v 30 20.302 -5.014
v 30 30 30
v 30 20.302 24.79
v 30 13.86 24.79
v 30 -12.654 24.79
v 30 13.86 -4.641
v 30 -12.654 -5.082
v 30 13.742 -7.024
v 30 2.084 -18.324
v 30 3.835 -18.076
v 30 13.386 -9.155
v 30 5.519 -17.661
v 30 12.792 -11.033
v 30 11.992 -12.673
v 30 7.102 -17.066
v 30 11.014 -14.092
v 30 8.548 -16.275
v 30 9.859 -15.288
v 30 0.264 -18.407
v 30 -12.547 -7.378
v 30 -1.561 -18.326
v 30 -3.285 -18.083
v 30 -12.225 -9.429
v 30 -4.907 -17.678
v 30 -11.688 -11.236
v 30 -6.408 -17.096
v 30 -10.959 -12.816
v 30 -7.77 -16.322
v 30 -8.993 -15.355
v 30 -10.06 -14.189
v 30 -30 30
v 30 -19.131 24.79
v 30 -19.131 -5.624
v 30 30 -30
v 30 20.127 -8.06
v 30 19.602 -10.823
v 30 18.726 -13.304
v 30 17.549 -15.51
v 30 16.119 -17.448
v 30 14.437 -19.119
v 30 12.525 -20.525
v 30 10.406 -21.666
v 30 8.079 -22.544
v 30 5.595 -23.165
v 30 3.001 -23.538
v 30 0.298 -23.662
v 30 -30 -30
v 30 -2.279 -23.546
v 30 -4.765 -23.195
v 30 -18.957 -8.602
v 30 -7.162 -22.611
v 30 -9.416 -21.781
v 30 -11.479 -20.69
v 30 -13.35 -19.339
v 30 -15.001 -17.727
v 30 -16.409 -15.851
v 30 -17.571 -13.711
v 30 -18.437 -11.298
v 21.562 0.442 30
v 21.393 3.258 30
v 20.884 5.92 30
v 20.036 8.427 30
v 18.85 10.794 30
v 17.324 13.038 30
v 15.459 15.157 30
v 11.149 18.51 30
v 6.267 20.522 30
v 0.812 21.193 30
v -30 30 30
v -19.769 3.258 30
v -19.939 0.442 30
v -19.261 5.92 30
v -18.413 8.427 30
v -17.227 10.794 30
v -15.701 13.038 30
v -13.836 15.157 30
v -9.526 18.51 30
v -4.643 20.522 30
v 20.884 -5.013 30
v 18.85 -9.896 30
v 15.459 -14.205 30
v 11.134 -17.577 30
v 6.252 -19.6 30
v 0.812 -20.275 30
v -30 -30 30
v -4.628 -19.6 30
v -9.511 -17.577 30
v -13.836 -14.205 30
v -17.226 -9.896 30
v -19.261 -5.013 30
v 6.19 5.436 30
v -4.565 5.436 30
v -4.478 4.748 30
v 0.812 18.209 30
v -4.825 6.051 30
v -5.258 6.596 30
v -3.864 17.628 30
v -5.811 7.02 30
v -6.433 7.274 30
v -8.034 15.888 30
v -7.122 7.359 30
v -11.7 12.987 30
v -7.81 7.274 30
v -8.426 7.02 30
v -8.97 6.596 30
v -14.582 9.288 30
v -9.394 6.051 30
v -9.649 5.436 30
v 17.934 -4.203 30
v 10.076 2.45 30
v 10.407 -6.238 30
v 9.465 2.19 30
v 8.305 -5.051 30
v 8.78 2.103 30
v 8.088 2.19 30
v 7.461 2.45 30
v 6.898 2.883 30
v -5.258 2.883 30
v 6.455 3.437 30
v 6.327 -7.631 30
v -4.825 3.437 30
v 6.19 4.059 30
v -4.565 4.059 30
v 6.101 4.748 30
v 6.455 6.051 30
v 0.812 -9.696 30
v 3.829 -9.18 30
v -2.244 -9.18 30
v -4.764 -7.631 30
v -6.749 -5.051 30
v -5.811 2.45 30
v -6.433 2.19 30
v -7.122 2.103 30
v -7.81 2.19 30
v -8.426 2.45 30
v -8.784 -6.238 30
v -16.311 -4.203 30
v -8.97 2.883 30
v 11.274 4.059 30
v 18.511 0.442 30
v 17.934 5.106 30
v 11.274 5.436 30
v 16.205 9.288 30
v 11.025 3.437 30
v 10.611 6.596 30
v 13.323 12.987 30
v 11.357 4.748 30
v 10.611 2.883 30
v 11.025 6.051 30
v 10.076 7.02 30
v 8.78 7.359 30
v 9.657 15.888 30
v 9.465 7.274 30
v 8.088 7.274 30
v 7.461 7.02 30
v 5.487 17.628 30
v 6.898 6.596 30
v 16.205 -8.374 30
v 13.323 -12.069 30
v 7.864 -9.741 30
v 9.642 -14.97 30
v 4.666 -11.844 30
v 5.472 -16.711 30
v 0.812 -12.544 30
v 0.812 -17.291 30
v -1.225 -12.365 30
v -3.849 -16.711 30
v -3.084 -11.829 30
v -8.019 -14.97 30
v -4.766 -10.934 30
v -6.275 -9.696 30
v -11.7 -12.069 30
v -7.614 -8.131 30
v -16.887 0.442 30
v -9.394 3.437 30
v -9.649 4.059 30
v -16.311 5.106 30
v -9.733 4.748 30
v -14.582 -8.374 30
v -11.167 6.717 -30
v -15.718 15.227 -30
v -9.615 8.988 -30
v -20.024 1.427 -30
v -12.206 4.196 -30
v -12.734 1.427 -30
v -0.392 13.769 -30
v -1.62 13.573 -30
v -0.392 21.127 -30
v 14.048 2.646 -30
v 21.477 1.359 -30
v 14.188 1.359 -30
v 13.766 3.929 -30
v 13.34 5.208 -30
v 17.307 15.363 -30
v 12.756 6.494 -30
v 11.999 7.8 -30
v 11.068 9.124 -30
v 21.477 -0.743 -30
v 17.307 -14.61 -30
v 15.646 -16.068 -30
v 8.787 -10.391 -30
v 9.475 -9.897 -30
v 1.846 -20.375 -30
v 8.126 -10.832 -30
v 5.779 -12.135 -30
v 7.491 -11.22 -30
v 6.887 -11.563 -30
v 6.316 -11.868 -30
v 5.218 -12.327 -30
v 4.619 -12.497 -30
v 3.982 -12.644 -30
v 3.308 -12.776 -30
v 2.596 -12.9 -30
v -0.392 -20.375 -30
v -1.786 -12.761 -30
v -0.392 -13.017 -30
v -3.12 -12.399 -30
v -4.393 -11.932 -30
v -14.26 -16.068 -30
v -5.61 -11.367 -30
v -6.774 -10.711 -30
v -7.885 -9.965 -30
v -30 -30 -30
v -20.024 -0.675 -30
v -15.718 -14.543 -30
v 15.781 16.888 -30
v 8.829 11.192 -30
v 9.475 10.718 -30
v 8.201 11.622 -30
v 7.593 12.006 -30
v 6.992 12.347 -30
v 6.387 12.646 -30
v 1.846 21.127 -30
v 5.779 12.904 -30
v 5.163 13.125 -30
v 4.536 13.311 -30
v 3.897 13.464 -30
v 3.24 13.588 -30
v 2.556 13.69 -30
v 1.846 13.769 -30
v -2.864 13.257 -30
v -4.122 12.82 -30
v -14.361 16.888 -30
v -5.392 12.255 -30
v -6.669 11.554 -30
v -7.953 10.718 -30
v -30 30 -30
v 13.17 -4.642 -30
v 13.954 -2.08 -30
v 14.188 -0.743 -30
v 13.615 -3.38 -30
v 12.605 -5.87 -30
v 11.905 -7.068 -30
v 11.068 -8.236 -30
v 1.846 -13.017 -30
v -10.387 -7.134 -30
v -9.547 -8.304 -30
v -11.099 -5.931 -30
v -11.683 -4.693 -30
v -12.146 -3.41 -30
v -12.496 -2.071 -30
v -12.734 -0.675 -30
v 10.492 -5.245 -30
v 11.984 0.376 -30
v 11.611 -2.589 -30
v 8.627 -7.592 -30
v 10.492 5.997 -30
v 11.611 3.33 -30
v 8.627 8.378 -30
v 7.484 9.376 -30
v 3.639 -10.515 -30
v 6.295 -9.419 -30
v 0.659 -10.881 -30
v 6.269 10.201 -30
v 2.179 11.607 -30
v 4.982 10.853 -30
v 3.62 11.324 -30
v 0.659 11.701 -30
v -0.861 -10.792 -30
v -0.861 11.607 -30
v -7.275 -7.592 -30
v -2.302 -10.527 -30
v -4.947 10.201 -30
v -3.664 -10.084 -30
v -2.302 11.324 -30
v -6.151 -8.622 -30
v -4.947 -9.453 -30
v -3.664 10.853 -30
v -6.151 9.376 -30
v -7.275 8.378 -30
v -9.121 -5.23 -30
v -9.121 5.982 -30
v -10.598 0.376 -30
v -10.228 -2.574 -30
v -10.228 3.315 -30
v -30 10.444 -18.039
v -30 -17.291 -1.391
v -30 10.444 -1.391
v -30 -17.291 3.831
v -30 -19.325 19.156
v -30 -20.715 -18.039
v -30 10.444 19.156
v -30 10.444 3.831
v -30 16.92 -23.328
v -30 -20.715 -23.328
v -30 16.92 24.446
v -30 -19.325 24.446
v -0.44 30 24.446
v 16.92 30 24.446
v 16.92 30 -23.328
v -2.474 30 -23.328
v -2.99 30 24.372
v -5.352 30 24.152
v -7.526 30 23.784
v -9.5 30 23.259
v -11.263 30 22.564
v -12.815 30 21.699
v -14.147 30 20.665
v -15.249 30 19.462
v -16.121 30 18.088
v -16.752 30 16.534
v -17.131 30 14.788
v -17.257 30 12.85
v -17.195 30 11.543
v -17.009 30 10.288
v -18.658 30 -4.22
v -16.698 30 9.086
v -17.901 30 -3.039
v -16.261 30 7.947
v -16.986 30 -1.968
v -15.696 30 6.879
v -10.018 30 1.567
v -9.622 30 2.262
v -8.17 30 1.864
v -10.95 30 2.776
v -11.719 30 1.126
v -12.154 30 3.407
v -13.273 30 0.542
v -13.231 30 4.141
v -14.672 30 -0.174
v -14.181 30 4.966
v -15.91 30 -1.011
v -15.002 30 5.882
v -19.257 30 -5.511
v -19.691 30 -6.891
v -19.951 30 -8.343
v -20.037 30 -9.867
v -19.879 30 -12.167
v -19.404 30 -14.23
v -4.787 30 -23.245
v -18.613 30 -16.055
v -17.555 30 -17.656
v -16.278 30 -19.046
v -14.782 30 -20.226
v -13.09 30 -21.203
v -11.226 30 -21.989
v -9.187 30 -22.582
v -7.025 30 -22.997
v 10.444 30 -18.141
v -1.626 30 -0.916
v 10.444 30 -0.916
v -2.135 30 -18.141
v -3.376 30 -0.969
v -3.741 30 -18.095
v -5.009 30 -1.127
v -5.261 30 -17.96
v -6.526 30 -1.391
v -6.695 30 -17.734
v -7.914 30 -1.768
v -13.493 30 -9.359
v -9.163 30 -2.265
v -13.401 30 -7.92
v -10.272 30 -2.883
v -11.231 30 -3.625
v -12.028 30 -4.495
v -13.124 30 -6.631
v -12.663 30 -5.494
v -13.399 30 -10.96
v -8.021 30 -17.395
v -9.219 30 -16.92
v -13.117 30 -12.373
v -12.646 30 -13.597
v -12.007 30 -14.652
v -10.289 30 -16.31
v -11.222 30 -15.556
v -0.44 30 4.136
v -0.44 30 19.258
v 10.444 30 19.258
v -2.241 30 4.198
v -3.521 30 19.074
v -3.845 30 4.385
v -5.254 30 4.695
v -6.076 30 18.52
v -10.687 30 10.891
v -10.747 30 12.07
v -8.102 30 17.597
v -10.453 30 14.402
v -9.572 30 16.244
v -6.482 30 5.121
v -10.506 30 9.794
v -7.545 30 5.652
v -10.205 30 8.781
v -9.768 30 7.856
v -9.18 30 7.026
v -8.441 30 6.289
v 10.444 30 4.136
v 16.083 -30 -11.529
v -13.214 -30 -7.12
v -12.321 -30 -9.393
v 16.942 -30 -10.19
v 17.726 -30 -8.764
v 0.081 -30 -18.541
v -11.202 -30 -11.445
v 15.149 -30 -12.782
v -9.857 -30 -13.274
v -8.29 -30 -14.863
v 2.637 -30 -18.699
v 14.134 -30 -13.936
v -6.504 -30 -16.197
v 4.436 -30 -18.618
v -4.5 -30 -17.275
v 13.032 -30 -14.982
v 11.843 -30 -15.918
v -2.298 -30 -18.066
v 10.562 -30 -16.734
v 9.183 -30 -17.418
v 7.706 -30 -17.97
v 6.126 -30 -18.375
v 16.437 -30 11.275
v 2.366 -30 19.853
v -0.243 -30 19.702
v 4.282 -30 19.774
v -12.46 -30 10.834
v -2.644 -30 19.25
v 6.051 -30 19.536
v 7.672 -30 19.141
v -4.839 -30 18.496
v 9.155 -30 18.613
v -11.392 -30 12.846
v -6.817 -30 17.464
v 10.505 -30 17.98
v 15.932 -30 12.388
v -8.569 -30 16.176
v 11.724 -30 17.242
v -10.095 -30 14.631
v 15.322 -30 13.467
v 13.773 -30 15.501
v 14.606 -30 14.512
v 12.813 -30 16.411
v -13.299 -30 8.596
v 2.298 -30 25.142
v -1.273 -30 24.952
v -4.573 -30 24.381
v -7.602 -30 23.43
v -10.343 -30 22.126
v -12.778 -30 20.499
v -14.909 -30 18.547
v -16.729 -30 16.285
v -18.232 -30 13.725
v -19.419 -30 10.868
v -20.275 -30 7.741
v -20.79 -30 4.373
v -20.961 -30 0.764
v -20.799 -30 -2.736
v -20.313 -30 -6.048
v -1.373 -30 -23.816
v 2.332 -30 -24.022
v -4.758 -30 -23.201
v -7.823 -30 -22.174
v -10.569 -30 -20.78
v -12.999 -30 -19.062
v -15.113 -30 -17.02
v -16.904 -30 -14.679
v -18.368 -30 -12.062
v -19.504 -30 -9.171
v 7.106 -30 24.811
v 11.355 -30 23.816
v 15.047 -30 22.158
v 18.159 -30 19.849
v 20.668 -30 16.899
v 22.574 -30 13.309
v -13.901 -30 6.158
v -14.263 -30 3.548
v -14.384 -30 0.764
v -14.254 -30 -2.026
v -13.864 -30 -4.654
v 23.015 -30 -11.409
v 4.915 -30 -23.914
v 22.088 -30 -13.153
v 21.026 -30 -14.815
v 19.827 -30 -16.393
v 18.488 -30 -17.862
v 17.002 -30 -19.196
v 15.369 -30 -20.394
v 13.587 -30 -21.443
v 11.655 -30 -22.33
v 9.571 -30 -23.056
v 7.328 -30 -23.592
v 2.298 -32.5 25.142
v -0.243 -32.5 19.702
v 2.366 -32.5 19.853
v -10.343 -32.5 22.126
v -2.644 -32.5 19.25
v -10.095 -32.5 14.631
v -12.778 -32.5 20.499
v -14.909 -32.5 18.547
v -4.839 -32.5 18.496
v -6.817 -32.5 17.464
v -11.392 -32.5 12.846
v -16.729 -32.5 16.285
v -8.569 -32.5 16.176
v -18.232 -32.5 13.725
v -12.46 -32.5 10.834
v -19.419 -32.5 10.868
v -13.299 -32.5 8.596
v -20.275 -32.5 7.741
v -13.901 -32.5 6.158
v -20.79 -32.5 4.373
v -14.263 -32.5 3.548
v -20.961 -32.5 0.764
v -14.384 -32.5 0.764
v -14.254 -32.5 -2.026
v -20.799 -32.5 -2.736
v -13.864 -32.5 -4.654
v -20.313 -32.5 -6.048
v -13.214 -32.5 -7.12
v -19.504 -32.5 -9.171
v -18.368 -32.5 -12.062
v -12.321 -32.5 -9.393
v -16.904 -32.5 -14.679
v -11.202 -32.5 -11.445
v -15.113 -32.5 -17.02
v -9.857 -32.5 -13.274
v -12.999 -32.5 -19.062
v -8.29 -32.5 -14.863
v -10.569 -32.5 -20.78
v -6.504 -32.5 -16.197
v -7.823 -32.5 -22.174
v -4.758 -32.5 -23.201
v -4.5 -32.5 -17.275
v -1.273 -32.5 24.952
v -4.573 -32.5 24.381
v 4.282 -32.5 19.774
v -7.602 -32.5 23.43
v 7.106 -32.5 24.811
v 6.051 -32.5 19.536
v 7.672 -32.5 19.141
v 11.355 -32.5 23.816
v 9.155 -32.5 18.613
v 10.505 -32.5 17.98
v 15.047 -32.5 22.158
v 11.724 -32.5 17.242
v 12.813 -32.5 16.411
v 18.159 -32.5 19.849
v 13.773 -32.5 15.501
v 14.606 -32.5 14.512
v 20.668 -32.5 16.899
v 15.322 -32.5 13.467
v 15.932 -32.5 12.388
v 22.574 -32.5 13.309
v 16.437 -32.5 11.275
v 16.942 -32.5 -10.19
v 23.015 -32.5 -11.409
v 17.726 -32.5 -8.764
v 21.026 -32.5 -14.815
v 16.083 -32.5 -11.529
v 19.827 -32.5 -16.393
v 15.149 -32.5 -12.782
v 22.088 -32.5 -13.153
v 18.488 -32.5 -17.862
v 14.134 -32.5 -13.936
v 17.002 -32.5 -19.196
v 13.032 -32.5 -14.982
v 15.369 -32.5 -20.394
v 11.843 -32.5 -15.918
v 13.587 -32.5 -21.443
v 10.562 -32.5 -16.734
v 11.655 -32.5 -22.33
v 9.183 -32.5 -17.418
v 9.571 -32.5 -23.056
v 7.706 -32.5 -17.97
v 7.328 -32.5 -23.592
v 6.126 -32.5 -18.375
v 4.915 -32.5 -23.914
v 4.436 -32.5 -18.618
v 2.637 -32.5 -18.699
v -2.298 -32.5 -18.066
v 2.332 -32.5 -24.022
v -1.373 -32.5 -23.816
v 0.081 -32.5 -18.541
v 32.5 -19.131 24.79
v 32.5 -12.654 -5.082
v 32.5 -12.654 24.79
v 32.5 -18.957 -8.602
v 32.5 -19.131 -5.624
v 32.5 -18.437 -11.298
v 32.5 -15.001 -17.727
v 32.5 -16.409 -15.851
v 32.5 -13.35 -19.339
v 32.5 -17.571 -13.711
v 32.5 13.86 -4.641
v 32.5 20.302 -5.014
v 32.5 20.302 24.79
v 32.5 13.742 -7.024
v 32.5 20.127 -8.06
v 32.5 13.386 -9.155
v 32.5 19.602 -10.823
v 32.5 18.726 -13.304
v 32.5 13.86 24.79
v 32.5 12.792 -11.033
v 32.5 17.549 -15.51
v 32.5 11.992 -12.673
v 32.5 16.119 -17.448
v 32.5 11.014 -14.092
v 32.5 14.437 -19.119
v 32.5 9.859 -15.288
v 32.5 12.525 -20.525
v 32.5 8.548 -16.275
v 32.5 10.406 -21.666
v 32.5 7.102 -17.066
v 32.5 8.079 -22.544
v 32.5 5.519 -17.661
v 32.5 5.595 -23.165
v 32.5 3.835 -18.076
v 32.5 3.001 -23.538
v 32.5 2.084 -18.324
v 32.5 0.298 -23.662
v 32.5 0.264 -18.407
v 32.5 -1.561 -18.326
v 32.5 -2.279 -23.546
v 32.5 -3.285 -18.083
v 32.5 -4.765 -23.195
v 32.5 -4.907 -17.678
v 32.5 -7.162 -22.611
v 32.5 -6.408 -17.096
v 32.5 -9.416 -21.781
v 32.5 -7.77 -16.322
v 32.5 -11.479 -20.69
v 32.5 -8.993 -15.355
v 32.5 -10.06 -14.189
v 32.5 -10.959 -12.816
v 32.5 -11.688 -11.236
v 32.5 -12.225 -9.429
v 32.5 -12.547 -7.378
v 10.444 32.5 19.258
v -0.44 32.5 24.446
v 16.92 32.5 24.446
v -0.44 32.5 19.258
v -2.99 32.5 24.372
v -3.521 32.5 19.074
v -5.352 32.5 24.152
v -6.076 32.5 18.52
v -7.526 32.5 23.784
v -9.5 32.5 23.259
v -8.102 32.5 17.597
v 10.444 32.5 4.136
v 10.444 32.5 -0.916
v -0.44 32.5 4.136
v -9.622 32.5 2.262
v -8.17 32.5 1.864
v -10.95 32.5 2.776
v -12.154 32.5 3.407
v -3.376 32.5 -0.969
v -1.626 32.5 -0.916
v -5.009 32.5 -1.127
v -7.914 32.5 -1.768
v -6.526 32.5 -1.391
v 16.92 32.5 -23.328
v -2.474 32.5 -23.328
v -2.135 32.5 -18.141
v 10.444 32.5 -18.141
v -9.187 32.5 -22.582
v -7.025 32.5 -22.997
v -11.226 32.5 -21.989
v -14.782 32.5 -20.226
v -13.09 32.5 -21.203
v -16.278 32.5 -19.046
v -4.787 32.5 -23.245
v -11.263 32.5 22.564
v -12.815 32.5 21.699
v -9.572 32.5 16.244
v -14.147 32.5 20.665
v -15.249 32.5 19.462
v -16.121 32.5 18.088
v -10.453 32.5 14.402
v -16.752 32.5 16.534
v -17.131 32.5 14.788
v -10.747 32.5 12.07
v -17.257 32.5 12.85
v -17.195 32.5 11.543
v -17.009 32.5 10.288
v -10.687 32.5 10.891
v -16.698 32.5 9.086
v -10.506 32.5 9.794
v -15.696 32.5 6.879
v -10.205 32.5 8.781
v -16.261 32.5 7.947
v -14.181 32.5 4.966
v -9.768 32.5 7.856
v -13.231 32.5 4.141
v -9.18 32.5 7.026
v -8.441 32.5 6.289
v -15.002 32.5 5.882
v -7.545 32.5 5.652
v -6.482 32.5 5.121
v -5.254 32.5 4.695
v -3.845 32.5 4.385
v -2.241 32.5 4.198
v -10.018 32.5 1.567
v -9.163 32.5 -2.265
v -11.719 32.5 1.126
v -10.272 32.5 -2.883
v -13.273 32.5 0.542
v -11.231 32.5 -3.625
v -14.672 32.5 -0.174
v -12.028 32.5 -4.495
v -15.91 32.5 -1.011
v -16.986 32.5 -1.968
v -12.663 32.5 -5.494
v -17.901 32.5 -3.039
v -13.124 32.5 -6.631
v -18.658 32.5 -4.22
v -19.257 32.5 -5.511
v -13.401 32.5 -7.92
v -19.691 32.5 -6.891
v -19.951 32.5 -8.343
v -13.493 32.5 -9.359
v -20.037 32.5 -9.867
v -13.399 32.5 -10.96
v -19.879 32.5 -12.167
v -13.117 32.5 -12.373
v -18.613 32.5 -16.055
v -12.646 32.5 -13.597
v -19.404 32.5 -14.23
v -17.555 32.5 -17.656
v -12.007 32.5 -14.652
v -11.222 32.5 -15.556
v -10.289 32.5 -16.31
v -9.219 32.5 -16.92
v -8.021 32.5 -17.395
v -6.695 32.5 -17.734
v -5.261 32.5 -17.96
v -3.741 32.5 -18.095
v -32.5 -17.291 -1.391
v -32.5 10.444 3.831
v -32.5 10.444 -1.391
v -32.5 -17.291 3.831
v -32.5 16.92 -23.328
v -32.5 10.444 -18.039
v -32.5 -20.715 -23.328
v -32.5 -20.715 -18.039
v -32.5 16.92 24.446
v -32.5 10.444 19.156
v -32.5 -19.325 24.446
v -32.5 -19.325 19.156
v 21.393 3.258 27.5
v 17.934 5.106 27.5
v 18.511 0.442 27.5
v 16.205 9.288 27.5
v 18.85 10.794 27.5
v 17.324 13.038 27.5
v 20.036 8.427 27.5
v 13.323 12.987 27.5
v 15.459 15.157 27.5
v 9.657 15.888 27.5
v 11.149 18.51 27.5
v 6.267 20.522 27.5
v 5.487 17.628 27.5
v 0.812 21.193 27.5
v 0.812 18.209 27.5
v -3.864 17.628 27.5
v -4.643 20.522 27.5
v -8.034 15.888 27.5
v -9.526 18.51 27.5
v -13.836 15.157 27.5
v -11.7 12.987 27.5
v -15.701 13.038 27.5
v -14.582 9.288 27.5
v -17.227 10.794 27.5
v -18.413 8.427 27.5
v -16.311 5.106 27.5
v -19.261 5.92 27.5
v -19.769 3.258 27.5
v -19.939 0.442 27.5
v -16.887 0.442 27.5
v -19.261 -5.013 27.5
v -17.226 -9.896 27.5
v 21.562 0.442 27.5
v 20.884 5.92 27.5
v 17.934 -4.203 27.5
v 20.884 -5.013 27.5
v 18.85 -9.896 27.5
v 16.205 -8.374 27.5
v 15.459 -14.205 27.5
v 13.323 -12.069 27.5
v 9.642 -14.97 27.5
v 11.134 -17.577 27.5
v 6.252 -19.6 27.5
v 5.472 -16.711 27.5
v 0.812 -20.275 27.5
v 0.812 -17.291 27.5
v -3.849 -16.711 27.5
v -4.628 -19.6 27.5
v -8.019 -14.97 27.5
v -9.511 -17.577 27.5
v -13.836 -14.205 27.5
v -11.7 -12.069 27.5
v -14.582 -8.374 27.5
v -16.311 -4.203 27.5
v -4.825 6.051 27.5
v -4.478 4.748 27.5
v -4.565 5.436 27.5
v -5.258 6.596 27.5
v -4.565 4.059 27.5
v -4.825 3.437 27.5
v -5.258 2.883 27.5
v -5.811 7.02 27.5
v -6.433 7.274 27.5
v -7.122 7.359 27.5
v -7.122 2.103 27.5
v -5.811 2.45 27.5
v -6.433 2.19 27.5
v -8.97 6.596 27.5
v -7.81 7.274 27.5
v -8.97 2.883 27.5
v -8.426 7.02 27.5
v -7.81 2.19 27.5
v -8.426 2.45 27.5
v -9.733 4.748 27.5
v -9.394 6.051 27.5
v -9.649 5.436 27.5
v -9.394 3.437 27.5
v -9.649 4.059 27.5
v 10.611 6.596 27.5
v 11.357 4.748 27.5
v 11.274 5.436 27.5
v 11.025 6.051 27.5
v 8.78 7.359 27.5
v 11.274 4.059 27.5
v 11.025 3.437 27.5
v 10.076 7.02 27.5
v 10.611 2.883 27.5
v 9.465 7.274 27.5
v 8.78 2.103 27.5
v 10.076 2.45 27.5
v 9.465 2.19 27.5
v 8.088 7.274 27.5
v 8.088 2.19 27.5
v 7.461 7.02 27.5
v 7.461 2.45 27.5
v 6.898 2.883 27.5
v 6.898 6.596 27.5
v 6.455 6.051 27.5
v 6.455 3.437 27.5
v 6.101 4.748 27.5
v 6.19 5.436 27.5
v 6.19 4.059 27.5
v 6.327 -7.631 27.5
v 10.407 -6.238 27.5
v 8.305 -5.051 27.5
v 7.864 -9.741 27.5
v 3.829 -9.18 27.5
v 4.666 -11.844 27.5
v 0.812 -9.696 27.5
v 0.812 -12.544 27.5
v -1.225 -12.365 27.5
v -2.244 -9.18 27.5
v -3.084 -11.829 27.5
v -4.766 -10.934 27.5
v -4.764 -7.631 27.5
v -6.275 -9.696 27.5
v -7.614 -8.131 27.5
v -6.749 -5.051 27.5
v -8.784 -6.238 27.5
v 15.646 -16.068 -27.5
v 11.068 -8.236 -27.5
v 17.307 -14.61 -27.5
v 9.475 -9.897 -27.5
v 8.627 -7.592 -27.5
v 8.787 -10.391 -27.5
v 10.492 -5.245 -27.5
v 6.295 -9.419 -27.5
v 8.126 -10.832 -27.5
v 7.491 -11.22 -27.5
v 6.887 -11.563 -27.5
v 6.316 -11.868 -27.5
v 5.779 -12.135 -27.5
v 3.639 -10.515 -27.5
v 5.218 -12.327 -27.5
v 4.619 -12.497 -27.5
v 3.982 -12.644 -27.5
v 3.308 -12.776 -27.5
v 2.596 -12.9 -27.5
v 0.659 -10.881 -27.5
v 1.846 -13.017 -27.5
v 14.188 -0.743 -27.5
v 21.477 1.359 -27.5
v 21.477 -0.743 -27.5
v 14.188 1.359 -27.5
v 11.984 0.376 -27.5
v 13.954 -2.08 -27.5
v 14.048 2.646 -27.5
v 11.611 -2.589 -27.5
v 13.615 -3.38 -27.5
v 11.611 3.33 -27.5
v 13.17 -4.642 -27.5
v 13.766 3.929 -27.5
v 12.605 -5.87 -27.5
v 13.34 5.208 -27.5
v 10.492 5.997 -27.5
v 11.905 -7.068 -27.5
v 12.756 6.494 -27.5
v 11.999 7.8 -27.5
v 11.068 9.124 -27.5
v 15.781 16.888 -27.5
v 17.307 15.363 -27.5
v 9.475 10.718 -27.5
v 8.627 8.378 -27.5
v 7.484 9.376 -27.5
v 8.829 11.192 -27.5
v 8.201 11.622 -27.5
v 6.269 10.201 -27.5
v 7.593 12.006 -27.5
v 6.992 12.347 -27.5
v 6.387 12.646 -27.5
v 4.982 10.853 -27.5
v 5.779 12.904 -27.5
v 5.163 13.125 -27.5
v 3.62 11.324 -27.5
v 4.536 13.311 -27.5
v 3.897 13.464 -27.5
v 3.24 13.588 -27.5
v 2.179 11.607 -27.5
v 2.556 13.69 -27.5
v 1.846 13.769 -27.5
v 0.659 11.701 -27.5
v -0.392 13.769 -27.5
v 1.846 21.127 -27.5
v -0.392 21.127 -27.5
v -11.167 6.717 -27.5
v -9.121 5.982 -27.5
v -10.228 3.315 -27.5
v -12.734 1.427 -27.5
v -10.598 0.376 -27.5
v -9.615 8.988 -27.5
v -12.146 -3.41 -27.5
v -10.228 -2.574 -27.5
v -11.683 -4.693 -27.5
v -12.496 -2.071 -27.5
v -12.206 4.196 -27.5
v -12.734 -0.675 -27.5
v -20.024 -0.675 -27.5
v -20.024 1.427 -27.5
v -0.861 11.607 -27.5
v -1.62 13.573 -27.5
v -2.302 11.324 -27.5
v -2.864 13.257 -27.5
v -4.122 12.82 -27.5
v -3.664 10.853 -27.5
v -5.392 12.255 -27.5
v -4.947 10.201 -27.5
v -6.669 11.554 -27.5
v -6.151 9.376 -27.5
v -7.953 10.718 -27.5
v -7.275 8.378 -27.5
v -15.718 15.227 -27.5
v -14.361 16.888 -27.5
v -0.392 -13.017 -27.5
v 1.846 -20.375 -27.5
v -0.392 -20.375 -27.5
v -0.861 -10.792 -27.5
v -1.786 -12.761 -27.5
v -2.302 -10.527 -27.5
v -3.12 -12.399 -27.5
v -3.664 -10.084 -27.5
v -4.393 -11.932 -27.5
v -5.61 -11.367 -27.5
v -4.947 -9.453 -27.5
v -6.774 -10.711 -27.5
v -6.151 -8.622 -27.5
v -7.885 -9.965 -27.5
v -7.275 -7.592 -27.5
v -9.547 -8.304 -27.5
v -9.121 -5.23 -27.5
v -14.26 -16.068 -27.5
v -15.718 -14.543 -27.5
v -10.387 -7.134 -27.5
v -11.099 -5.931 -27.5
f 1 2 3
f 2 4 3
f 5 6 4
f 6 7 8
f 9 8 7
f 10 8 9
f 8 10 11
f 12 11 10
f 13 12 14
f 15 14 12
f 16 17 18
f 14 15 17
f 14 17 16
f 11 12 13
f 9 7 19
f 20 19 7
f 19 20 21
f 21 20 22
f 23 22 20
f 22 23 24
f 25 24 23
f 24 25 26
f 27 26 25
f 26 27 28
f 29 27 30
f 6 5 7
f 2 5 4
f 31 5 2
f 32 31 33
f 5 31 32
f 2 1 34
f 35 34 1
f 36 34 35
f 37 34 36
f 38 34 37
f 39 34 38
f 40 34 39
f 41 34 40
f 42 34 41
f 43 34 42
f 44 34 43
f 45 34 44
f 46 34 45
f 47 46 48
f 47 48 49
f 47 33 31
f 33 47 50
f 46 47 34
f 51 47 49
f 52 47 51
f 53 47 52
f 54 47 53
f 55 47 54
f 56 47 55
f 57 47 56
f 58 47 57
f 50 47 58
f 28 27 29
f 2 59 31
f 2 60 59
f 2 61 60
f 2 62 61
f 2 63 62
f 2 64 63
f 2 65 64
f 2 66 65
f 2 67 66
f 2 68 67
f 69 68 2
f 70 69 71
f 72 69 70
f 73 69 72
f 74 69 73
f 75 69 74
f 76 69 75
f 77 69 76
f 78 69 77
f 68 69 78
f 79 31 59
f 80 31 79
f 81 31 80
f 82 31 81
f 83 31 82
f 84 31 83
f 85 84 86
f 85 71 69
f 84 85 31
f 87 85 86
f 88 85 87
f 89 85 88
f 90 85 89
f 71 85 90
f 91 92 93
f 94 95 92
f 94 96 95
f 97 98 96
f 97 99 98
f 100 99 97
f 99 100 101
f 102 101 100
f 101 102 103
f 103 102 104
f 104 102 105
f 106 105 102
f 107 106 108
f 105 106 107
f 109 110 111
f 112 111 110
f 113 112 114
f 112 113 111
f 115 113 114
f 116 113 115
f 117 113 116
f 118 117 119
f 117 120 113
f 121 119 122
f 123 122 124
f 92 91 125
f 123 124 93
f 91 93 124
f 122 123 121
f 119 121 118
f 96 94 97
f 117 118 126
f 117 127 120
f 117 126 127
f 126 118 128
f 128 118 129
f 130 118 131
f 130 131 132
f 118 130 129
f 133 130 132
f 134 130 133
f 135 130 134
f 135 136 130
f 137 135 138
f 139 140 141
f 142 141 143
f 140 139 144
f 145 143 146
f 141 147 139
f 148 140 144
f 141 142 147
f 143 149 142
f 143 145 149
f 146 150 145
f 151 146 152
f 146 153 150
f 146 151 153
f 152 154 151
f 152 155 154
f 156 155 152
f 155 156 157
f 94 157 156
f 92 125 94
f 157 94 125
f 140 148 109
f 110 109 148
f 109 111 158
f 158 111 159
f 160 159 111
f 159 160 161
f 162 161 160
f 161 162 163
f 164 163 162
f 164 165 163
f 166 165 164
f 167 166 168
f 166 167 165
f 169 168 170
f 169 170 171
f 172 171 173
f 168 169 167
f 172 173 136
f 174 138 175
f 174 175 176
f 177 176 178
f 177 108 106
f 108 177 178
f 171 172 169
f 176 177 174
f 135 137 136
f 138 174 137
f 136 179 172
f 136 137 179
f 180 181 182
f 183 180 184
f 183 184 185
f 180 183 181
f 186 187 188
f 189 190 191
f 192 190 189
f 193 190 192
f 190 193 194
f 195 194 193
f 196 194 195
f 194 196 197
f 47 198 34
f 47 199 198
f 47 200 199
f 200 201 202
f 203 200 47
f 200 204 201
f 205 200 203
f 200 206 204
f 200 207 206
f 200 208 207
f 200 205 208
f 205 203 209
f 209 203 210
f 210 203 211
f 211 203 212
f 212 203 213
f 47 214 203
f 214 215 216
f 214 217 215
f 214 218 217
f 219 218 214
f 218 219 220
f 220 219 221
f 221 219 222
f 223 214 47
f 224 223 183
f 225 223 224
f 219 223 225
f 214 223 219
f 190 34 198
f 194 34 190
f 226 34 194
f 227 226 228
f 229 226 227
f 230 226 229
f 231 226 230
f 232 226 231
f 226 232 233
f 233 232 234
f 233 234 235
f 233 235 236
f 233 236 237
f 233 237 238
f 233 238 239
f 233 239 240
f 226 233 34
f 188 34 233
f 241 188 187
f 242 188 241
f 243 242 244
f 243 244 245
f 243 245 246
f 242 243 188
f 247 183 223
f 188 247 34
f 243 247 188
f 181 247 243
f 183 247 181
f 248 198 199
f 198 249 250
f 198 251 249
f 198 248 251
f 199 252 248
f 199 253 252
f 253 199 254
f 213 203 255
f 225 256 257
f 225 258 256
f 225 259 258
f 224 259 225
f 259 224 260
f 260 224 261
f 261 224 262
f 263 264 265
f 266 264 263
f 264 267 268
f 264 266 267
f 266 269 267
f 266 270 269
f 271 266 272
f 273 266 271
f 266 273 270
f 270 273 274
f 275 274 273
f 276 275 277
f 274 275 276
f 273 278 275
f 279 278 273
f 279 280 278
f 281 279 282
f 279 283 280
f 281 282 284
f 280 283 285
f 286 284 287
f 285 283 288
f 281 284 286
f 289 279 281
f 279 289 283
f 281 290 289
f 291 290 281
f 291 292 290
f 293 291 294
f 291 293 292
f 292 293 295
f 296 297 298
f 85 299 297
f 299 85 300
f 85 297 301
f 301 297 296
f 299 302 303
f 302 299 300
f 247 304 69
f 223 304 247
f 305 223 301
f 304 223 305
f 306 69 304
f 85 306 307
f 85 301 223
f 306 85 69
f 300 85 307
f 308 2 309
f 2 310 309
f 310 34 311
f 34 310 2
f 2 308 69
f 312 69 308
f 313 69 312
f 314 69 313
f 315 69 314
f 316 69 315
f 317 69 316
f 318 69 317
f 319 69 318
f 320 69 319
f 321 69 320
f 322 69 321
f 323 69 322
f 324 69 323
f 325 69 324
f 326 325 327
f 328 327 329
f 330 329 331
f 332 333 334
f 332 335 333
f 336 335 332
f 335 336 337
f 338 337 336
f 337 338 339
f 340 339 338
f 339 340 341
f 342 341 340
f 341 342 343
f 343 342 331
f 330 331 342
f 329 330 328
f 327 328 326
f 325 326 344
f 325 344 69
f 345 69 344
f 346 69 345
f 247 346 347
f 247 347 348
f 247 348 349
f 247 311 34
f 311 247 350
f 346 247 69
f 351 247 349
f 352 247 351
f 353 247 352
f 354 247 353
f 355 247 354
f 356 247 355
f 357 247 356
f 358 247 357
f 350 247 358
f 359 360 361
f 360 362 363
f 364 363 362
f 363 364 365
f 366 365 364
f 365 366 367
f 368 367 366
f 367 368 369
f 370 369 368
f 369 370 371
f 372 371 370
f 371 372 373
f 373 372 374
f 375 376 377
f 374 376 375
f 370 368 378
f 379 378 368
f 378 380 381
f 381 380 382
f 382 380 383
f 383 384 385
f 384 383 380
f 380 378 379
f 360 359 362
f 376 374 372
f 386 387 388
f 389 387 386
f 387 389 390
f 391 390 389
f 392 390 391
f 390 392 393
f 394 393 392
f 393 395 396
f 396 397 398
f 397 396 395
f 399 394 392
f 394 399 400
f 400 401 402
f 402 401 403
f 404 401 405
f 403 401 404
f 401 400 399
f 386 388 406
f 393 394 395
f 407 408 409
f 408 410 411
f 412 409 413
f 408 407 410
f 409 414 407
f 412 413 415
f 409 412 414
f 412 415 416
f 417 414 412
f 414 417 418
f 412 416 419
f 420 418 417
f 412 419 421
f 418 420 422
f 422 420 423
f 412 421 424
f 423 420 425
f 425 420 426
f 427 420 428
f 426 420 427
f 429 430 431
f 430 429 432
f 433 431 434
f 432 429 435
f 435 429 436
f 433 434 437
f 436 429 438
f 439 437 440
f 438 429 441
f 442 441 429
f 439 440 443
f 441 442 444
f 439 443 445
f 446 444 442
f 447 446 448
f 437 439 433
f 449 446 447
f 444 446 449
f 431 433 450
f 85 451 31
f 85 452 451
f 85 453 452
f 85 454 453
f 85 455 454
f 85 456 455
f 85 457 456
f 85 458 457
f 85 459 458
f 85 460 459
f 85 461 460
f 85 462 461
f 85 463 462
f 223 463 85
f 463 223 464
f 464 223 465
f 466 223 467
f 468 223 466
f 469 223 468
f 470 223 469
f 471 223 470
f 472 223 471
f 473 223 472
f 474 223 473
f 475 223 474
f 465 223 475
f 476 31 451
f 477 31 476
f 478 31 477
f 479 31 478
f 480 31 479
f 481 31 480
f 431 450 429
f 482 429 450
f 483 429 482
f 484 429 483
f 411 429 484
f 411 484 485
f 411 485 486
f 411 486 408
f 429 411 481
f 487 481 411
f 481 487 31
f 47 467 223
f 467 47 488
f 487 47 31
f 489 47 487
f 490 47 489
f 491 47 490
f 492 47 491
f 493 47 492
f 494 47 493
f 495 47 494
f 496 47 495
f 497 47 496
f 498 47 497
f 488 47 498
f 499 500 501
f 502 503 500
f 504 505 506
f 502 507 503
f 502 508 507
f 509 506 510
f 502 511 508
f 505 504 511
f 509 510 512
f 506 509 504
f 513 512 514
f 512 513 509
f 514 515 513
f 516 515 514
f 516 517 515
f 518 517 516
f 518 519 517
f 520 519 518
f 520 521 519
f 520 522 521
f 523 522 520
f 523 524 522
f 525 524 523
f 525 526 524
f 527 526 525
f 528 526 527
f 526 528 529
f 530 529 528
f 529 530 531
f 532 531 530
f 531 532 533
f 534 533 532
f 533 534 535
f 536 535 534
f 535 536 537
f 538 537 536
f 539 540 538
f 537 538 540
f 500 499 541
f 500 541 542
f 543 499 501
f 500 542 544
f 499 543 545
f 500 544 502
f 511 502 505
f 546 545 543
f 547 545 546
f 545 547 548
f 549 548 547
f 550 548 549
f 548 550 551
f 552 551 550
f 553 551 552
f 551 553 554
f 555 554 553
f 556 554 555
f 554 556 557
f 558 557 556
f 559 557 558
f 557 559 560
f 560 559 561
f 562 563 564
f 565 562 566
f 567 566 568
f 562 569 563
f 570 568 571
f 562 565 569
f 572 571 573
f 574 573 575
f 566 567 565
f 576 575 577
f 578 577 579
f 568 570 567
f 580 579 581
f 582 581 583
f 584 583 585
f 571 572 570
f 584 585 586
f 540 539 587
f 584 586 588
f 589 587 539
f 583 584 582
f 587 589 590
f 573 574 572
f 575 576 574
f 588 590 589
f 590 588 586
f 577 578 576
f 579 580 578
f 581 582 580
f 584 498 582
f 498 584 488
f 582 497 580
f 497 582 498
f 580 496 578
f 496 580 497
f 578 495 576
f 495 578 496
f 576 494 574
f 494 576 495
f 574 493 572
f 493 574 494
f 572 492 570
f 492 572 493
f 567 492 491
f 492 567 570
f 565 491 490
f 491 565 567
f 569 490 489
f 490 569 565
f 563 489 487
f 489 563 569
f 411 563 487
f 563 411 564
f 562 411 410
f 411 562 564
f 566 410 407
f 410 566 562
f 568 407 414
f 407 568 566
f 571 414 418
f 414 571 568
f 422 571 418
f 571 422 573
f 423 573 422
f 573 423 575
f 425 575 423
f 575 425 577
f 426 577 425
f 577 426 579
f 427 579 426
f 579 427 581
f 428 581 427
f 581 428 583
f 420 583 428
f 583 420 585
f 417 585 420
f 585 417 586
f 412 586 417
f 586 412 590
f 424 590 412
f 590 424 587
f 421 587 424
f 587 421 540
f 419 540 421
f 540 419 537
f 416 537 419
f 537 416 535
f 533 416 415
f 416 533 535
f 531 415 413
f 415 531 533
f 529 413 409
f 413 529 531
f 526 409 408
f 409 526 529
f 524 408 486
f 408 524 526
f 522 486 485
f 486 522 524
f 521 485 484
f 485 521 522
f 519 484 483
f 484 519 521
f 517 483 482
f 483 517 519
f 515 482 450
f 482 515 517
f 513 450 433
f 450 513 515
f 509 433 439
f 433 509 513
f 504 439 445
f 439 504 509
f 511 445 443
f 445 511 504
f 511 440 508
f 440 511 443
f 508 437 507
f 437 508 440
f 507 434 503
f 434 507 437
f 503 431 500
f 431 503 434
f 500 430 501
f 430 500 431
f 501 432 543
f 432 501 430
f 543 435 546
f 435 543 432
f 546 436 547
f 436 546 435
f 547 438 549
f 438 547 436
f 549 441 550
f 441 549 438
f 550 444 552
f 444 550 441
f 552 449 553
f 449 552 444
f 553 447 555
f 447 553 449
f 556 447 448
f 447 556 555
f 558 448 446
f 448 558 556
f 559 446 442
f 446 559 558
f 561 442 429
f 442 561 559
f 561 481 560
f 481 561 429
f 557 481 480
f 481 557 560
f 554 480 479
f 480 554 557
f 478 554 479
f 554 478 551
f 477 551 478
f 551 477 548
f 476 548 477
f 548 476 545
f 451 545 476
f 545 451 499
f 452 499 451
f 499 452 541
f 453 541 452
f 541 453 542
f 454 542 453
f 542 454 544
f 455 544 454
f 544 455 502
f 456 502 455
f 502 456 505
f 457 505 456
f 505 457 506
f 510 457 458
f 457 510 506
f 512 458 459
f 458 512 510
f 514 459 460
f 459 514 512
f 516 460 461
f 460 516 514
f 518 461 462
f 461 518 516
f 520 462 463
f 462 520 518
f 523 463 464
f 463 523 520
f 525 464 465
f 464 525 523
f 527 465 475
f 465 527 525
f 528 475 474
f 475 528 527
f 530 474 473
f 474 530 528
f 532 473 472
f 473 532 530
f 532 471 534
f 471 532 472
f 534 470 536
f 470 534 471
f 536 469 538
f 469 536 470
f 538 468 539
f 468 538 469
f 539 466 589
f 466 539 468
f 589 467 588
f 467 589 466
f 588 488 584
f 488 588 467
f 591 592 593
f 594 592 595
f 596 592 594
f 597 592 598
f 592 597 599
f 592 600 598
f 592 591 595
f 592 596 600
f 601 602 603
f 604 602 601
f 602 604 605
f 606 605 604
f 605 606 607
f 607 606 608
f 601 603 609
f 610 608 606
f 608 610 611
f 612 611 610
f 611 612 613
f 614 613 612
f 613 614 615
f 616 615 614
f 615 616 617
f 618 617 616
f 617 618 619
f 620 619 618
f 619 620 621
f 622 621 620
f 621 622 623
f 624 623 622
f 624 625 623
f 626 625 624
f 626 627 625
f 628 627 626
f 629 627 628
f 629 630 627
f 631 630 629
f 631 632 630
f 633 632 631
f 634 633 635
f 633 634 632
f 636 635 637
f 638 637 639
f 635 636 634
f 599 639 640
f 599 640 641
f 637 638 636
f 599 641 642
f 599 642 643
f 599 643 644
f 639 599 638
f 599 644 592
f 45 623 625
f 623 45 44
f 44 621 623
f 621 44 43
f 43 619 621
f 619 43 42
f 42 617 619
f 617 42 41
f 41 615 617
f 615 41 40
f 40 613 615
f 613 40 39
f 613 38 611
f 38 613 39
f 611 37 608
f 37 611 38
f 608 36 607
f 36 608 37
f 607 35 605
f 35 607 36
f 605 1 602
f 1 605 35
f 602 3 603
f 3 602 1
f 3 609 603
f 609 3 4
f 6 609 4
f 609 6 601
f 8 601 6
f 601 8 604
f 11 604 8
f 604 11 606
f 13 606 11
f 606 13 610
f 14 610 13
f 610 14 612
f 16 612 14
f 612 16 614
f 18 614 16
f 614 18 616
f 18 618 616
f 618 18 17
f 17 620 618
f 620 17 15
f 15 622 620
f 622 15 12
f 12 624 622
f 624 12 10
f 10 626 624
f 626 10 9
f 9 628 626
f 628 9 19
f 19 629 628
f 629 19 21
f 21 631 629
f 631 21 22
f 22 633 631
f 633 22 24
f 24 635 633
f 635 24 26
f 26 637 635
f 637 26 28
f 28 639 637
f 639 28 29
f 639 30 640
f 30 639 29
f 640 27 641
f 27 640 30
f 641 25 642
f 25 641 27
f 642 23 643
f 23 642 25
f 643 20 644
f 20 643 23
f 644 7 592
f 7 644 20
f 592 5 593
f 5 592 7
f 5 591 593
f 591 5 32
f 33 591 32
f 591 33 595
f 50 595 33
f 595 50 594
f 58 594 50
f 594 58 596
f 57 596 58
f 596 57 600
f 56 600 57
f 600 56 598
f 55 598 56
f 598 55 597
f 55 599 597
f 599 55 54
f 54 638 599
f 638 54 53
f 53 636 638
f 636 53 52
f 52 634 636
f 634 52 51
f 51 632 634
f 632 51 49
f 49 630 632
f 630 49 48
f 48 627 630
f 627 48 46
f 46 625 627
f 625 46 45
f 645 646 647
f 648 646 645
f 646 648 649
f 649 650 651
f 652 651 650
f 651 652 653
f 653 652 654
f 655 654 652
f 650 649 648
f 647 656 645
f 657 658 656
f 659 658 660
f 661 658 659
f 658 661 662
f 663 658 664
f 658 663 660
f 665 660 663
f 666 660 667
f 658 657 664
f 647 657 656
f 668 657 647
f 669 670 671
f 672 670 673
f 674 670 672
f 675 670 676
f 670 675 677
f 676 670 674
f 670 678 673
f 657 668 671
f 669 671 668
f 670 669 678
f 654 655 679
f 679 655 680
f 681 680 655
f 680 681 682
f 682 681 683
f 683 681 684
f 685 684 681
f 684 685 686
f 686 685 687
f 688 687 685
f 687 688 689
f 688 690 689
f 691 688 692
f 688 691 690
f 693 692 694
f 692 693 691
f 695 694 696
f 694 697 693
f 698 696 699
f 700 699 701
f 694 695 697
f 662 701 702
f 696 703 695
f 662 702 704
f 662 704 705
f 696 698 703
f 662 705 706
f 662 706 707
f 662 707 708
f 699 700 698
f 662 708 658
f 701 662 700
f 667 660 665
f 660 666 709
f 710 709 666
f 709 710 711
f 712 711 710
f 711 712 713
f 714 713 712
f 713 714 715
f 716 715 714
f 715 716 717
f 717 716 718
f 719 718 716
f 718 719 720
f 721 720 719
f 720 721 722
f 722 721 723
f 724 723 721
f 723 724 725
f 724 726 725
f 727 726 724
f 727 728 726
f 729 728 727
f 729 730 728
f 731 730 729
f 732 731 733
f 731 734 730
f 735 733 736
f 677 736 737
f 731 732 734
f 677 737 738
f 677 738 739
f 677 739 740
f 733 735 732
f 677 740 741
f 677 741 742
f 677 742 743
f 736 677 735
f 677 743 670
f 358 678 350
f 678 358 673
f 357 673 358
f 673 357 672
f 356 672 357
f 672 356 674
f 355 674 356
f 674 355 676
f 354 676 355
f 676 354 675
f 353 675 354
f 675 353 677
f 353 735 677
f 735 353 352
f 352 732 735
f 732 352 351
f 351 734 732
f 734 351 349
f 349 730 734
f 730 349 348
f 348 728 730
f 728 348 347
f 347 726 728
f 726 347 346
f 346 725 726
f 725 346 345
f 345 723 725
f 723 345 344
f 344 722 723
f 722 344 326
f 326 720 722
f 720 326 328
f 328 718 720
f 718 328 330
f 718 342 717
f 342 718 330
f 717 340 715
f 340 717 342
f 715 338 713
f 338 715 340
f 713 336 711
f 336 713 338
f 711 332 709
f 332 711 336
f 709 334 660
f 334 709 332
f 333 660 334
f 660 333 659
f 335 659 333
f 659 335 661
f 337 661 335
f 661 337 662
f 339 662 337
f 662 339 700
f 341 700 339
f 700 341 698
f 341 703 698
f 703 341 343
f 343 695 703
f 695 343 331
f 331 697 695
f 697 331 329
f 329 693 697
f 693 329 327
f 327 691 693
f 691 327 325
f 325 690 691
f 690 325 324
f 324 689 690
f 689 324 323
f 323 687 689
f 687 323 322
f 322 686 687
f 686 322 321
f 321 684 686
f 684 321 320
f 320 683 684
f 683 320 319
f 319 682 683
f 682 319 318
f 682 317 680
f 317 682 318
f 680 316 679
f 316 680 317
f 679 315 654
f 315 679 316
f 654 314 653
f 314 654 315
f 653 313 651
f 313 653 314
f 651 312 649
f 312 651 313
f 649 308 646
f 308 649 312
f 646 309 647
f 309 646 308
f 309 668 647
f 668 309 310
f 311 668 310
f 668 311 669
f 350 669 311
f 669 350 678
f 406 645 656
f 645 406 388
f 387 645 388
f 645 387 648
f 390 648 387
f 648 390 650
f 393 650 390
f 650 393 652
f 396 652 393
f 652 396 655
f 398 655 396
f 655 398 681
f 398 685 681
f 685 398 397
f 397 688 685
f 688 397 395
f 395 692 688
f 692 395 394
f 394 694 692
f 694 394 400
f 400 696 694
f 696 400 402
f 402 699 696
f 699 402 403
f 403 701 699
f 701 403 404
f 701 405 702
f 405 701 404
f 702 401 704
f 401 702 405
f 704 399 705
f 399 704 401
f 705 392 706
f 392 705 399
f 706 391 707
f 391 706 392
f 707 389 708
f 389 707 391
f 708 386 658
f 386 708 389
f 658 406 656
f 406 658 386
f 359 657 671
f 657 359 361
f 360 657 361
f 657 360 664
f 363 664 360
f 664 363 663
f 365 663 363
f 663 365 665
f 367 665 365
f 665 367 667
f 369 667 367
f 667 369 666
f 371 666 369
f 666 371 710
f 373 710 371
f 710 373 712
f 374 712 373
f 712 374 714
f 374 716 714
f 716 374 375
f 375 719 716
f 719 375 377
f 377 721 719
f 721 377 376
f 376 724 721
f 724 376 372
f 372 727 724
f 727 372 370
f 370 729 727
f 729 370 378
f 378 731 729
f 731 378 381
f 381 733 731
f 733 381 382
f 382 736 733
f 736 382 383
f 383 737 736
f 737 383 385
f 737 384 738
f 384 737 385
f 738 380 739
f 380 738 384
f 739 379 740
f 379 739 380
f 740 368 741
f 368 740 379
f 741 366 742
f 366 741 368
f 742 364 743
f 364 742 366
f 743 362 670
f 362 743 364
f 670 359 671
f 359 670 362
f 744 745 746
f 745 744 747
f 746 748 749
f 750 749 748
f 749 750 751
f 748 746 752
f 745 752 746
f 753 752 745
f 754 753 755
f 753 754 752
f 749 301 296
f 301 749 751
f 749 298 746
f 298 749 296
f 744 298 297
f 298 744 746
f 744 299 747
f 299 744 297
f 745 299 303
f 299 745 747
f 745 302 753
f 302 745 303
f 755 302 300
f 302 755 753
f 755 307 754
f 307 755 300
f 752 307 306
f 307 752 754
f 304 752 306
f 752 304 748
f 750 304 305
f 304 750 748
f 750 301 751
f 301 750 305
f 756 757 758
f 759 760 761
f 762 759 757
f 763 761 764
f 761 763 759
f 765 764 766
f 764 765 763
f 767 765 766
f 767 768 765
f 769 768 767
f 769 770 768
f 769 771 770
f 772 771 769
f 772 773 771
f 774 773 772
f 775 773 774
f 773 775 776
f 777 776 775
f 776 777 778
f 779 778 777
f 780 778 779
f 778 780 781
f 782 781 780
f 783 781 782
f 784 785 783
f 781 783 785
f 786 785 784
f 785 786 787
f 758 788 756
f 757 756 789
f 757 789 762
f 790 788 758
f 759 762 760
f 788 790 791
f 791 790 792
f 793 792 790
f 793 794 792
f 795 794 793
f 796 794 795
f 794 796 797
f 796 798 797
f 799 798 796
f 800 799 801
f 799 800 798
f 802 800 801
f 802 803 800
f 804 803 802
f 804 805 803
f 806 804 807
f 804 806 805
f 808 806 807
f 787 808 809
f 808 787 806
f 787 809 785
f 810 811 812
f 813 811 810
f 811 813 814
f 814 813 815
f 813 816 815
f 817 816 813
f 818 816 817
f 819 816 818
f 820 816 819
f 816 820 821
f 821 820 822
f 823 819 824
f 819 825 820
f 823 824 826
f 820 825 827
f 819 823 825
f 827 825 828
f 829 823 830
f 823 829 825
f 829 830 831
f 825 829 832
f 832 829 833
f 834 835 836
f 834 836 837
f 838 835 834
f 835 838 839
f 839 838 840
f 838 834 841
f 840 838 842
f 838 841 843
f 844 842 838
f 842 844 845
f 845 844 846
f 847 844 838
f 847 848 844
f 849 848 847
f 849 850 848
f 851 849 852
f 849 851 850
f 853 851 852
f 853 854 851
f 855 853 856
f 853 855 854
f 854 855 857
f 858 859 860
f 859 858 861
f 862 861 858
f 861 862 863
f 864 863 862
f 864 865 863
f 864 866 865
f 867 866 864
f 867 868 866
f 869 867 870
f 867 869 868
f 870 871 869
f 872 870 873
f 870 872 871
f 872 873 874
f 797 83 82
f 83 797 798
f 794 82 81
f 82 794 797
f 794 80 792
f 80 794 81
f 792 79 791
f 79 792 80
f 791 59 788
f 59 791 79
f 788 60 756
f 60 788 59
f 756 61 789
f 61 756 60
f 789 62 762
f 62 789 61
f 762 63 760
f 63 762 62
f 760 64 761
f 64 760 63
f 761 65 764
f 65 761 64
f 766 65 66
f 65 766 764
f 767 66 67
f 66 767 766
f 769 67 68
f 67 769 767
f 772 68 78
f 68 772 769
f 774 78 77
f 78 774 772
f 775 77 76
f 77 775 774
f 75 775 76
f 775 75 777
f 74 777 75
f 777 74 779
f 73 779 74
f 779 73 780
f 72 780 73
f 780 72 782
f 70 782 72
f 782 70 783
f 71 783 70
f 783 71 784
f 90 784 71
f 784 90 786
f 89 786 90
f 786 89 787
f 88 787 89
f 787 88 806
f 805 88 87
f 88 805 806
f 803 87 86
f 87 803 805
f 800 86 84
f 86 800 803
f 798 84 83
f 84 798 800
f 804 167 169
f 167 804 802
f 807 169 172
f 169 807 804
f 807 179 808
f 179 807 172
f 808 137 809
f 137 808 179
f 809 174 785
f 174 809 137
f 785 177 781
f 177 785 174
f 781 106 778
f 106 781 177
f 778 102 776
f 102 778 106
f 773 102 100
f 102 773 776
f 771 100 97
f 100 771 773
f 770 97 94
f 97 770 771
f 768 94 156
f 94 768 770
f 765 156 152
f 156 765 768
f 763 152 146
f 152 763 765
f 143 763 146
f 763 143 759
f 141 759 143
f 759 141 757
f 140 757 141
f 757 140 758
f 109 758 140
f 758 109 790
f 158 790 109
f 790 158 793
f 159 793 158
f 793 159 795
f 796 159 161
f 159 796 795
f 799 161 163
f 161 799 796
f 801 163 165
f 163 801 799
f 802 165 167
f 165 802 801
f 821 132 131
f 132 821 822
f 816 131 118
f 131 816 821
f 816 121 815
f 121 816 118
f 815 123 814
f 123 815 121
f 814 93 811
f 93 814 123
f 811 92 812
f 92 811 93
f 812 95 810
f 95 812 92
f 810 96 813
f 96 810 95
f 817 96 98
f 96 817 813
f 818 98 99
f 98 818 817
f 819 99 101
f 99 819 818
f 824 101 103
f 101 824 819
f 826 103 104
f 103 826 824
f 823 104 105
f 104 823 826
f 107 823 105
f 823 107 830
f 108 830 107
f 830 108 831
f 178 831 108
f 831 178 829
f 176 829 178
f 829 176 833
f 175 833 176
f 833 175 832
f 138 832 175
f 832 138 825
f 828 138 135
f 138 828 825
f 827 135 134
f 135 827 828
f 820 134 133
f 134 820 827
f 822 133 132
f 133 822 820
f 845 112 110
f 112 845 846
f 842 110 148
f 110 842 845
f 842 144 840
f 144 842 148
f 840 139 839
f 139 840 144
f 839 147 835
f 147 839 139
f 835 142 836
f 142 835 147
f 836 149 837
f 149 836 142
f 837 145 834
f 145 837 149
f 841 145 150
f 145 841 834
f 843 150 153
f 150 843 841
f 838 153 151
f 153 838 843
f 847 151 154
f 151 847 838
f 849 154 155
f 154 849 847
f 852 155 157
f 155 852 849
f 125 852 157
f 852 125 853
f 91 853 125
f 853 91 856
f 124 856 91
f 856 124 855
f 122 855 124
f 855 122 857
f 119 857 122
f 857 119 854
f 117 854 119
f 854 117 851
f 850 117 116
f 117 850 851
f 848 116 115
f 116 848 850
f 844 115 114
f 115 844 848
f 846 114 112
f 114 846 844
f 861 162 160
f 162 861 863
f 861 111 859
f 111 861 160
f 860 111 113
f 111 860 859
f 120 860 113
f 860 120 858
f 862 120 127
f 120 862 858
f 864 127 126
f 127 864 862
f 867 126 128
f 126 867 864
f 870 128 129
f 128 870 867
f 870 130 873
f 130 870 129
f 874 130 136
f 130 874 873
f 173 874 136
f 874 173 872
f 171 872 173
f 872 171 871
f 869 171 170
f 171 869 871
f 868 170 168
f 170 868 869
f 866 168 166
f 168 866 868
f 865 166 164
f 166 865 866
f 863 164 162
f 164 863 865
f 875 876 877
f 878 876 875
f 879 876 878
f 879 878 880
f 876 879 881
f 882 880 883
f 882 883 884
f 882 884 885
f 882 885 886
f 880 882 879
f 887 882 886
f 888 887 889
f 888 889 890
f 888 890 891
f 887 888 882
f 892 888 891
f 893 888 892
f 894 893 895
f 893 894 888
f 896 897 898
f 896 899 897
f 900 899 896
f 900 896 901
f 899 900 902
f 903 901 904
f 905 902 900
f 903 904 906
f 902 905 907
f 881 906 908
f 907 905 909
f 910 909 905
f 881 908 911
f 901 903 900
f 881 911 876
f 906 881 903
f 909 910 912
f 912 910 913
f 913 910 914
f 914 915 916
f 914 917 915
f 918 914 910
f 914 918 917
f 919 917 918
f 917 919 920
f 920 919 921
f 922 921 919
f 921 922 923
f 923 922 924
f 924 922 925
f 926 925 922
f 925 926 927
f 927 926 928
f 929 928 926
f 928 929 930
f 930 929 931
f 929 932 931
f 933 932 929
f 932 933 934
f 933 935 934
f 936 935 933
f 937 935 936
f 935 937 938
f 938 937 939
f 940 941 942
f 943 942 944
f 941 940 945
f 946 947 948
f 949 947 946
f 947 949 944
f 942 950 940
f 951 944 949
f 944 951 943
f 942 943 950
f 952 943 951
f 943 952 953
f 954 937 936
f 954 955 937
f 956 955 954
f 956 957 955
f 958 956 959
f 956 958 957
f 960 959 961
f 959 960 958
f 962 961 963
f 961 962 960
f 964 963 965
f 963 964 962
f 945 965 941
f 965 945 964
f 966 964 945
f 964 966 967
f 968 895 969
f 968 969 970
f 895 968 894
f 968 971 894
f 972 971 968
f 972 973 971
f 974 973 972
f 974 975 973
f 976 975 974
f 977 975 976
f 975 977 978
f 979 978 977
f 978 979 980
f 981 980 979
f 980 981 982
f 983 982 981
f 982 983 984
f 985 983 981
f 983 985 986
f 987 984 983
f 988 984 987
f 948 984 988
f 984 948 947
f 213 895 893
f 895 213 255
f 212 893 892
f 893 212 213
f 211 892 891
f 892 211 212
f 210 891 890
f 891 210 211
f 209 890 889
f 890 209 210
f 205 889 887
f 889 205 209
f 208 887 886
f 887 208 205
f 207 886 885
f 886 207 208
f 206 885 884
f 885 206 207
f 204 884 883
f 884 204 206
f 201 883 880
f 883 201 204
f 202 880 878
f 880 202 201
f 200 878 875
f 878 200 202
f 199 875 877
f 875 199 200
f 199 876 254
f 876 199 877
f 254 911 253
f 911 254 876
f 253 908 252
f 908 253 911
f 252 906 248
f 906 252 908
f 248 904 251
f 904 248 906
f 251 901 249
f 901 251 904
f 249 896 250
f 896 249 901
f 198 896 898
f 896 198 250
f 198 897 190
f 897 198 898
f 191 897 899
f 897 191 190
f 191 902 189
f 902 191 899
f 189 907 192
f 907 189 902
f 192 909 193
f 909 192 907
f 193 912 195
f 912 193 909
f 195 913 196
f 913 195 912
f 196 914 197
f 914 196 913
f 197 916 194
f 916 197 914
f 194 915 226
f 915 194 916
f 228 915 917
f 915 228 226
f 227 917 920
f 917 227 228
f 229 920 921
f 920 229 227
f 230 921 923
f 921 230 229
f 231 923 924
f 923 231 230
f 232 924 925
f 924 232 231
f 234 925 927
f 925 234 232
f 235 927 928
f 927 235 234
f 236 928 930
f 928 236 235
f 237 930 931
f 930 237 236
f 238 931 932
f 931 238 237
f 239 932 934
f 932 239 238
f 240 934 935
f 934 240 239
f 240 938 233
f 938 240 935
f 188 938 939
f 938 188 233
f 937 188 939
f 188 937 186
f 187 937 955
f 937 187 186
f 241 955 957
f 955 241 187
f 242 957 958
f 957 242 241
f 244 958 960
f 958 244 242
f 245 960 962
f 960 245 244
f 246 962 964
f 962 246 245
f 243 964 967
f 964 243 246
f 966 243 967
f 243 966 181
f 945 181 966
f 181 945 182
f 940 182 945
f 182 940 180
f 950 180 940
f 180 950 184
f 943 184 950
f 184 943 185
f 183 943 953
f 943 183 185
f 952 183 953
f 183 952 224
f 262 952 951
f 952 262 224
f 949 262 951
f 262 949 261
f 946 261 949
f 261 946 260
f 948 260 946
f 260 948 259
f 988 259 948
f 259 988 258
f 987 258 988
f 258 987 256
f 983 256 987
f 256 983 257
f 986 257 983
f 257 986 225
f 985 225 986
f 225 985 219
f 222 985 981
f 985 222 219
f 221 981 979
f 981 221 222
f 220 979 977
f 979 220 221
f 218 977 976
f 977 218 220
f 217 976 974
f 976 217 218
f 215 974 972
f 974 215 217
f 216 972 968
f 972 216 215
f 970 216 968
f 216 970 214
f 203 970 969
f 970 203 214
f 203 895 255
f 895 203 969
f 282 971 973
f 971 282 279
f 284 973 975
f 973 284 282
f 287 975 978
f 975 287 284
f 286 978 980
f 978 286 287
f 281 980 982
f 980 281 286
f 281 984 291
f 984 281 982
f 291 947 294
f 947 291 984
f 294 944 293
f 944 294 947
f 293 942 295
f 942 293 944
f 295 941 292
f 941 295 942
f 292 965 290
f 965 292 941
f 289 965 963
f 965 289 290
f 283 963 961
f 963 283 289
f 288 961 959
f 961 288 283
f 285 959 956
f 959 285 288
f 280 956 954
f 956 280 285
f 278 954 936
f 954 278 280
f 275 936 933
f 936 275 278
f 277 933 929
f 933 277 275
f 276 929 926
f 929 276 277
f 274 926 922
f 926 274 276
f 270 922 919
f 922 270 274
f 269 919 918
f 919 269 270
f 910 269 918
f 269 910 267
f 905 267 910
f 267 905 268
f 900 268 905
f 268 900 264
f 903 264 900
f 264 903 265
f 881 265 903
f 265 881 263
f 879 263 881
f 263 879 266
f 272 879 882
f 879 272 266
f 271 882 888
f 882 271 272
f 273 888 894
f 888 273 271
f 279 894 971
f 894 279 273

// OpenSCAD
// text_on_cube.scad - Example for text() usage in OpenSCAD

$fn = 64;
echo(version=version());

font = "Liberation Sans"; //["Liberation Sans", "Liberation Sans:style=Bold", "Liberation Sans:style=Italic", "Liberation Mono", "Liberation Serif"]

cube_size = 60;
letter_size = 50;
letter_height = 5;

o = cube_size / 2 - letter_height / 2;

module letter(l) {
  // Use linear_extrude() to make the letters 3D objects as they
  // are only 2D shapes when only using text()
  linear_extrude(height = letter_height) {
    text(l, size = letter_size, font = font, halign = "center", valign = "center", $fn = 16);
  }
}

difference() {
  union() {
    color("gray") cube(cube_size, center = true);
    translate([0, -o, 0]) rotate([90, 0, 0]) letter("C");
    translate([o, 0, 0]) rotate([90, 0, 90]) letter("U");
    translate([0, o, 0]) rotate([90, 0, 180]) letter("B");
    translate([-o, 0, 0]) rotate([90, 0, -90]) letter("E");
  }

  // Put some symbols on top and bottom using symbols from the
  // Unicode symbols table.
  // (see https://en.wikipedia.org/wiki/Miscellaneous_Symbols)
  //
  // Note that depending on the font used, not all the symbols
  // are actually available.
  translate([0, 0, o])  letter("\u263A");
  translate([0, 0, -o - letter_height])  letter("\u263C");
}



// Written in 2014 by Torsten Paul <Torsten.Paul@gmx.de>
//
// To the extent possible under law, the author(s) have dedicated all
// copyright and related and neighboring rights to this software to the
// public domain worldwide. This software is distributed without any
// warranty.
//
// You should have received a copy of the CC0 Public Domain
// Dedication along with this software.
// If not, see <http://creativecommons.org/publicdomain/zero/1.0/>.
